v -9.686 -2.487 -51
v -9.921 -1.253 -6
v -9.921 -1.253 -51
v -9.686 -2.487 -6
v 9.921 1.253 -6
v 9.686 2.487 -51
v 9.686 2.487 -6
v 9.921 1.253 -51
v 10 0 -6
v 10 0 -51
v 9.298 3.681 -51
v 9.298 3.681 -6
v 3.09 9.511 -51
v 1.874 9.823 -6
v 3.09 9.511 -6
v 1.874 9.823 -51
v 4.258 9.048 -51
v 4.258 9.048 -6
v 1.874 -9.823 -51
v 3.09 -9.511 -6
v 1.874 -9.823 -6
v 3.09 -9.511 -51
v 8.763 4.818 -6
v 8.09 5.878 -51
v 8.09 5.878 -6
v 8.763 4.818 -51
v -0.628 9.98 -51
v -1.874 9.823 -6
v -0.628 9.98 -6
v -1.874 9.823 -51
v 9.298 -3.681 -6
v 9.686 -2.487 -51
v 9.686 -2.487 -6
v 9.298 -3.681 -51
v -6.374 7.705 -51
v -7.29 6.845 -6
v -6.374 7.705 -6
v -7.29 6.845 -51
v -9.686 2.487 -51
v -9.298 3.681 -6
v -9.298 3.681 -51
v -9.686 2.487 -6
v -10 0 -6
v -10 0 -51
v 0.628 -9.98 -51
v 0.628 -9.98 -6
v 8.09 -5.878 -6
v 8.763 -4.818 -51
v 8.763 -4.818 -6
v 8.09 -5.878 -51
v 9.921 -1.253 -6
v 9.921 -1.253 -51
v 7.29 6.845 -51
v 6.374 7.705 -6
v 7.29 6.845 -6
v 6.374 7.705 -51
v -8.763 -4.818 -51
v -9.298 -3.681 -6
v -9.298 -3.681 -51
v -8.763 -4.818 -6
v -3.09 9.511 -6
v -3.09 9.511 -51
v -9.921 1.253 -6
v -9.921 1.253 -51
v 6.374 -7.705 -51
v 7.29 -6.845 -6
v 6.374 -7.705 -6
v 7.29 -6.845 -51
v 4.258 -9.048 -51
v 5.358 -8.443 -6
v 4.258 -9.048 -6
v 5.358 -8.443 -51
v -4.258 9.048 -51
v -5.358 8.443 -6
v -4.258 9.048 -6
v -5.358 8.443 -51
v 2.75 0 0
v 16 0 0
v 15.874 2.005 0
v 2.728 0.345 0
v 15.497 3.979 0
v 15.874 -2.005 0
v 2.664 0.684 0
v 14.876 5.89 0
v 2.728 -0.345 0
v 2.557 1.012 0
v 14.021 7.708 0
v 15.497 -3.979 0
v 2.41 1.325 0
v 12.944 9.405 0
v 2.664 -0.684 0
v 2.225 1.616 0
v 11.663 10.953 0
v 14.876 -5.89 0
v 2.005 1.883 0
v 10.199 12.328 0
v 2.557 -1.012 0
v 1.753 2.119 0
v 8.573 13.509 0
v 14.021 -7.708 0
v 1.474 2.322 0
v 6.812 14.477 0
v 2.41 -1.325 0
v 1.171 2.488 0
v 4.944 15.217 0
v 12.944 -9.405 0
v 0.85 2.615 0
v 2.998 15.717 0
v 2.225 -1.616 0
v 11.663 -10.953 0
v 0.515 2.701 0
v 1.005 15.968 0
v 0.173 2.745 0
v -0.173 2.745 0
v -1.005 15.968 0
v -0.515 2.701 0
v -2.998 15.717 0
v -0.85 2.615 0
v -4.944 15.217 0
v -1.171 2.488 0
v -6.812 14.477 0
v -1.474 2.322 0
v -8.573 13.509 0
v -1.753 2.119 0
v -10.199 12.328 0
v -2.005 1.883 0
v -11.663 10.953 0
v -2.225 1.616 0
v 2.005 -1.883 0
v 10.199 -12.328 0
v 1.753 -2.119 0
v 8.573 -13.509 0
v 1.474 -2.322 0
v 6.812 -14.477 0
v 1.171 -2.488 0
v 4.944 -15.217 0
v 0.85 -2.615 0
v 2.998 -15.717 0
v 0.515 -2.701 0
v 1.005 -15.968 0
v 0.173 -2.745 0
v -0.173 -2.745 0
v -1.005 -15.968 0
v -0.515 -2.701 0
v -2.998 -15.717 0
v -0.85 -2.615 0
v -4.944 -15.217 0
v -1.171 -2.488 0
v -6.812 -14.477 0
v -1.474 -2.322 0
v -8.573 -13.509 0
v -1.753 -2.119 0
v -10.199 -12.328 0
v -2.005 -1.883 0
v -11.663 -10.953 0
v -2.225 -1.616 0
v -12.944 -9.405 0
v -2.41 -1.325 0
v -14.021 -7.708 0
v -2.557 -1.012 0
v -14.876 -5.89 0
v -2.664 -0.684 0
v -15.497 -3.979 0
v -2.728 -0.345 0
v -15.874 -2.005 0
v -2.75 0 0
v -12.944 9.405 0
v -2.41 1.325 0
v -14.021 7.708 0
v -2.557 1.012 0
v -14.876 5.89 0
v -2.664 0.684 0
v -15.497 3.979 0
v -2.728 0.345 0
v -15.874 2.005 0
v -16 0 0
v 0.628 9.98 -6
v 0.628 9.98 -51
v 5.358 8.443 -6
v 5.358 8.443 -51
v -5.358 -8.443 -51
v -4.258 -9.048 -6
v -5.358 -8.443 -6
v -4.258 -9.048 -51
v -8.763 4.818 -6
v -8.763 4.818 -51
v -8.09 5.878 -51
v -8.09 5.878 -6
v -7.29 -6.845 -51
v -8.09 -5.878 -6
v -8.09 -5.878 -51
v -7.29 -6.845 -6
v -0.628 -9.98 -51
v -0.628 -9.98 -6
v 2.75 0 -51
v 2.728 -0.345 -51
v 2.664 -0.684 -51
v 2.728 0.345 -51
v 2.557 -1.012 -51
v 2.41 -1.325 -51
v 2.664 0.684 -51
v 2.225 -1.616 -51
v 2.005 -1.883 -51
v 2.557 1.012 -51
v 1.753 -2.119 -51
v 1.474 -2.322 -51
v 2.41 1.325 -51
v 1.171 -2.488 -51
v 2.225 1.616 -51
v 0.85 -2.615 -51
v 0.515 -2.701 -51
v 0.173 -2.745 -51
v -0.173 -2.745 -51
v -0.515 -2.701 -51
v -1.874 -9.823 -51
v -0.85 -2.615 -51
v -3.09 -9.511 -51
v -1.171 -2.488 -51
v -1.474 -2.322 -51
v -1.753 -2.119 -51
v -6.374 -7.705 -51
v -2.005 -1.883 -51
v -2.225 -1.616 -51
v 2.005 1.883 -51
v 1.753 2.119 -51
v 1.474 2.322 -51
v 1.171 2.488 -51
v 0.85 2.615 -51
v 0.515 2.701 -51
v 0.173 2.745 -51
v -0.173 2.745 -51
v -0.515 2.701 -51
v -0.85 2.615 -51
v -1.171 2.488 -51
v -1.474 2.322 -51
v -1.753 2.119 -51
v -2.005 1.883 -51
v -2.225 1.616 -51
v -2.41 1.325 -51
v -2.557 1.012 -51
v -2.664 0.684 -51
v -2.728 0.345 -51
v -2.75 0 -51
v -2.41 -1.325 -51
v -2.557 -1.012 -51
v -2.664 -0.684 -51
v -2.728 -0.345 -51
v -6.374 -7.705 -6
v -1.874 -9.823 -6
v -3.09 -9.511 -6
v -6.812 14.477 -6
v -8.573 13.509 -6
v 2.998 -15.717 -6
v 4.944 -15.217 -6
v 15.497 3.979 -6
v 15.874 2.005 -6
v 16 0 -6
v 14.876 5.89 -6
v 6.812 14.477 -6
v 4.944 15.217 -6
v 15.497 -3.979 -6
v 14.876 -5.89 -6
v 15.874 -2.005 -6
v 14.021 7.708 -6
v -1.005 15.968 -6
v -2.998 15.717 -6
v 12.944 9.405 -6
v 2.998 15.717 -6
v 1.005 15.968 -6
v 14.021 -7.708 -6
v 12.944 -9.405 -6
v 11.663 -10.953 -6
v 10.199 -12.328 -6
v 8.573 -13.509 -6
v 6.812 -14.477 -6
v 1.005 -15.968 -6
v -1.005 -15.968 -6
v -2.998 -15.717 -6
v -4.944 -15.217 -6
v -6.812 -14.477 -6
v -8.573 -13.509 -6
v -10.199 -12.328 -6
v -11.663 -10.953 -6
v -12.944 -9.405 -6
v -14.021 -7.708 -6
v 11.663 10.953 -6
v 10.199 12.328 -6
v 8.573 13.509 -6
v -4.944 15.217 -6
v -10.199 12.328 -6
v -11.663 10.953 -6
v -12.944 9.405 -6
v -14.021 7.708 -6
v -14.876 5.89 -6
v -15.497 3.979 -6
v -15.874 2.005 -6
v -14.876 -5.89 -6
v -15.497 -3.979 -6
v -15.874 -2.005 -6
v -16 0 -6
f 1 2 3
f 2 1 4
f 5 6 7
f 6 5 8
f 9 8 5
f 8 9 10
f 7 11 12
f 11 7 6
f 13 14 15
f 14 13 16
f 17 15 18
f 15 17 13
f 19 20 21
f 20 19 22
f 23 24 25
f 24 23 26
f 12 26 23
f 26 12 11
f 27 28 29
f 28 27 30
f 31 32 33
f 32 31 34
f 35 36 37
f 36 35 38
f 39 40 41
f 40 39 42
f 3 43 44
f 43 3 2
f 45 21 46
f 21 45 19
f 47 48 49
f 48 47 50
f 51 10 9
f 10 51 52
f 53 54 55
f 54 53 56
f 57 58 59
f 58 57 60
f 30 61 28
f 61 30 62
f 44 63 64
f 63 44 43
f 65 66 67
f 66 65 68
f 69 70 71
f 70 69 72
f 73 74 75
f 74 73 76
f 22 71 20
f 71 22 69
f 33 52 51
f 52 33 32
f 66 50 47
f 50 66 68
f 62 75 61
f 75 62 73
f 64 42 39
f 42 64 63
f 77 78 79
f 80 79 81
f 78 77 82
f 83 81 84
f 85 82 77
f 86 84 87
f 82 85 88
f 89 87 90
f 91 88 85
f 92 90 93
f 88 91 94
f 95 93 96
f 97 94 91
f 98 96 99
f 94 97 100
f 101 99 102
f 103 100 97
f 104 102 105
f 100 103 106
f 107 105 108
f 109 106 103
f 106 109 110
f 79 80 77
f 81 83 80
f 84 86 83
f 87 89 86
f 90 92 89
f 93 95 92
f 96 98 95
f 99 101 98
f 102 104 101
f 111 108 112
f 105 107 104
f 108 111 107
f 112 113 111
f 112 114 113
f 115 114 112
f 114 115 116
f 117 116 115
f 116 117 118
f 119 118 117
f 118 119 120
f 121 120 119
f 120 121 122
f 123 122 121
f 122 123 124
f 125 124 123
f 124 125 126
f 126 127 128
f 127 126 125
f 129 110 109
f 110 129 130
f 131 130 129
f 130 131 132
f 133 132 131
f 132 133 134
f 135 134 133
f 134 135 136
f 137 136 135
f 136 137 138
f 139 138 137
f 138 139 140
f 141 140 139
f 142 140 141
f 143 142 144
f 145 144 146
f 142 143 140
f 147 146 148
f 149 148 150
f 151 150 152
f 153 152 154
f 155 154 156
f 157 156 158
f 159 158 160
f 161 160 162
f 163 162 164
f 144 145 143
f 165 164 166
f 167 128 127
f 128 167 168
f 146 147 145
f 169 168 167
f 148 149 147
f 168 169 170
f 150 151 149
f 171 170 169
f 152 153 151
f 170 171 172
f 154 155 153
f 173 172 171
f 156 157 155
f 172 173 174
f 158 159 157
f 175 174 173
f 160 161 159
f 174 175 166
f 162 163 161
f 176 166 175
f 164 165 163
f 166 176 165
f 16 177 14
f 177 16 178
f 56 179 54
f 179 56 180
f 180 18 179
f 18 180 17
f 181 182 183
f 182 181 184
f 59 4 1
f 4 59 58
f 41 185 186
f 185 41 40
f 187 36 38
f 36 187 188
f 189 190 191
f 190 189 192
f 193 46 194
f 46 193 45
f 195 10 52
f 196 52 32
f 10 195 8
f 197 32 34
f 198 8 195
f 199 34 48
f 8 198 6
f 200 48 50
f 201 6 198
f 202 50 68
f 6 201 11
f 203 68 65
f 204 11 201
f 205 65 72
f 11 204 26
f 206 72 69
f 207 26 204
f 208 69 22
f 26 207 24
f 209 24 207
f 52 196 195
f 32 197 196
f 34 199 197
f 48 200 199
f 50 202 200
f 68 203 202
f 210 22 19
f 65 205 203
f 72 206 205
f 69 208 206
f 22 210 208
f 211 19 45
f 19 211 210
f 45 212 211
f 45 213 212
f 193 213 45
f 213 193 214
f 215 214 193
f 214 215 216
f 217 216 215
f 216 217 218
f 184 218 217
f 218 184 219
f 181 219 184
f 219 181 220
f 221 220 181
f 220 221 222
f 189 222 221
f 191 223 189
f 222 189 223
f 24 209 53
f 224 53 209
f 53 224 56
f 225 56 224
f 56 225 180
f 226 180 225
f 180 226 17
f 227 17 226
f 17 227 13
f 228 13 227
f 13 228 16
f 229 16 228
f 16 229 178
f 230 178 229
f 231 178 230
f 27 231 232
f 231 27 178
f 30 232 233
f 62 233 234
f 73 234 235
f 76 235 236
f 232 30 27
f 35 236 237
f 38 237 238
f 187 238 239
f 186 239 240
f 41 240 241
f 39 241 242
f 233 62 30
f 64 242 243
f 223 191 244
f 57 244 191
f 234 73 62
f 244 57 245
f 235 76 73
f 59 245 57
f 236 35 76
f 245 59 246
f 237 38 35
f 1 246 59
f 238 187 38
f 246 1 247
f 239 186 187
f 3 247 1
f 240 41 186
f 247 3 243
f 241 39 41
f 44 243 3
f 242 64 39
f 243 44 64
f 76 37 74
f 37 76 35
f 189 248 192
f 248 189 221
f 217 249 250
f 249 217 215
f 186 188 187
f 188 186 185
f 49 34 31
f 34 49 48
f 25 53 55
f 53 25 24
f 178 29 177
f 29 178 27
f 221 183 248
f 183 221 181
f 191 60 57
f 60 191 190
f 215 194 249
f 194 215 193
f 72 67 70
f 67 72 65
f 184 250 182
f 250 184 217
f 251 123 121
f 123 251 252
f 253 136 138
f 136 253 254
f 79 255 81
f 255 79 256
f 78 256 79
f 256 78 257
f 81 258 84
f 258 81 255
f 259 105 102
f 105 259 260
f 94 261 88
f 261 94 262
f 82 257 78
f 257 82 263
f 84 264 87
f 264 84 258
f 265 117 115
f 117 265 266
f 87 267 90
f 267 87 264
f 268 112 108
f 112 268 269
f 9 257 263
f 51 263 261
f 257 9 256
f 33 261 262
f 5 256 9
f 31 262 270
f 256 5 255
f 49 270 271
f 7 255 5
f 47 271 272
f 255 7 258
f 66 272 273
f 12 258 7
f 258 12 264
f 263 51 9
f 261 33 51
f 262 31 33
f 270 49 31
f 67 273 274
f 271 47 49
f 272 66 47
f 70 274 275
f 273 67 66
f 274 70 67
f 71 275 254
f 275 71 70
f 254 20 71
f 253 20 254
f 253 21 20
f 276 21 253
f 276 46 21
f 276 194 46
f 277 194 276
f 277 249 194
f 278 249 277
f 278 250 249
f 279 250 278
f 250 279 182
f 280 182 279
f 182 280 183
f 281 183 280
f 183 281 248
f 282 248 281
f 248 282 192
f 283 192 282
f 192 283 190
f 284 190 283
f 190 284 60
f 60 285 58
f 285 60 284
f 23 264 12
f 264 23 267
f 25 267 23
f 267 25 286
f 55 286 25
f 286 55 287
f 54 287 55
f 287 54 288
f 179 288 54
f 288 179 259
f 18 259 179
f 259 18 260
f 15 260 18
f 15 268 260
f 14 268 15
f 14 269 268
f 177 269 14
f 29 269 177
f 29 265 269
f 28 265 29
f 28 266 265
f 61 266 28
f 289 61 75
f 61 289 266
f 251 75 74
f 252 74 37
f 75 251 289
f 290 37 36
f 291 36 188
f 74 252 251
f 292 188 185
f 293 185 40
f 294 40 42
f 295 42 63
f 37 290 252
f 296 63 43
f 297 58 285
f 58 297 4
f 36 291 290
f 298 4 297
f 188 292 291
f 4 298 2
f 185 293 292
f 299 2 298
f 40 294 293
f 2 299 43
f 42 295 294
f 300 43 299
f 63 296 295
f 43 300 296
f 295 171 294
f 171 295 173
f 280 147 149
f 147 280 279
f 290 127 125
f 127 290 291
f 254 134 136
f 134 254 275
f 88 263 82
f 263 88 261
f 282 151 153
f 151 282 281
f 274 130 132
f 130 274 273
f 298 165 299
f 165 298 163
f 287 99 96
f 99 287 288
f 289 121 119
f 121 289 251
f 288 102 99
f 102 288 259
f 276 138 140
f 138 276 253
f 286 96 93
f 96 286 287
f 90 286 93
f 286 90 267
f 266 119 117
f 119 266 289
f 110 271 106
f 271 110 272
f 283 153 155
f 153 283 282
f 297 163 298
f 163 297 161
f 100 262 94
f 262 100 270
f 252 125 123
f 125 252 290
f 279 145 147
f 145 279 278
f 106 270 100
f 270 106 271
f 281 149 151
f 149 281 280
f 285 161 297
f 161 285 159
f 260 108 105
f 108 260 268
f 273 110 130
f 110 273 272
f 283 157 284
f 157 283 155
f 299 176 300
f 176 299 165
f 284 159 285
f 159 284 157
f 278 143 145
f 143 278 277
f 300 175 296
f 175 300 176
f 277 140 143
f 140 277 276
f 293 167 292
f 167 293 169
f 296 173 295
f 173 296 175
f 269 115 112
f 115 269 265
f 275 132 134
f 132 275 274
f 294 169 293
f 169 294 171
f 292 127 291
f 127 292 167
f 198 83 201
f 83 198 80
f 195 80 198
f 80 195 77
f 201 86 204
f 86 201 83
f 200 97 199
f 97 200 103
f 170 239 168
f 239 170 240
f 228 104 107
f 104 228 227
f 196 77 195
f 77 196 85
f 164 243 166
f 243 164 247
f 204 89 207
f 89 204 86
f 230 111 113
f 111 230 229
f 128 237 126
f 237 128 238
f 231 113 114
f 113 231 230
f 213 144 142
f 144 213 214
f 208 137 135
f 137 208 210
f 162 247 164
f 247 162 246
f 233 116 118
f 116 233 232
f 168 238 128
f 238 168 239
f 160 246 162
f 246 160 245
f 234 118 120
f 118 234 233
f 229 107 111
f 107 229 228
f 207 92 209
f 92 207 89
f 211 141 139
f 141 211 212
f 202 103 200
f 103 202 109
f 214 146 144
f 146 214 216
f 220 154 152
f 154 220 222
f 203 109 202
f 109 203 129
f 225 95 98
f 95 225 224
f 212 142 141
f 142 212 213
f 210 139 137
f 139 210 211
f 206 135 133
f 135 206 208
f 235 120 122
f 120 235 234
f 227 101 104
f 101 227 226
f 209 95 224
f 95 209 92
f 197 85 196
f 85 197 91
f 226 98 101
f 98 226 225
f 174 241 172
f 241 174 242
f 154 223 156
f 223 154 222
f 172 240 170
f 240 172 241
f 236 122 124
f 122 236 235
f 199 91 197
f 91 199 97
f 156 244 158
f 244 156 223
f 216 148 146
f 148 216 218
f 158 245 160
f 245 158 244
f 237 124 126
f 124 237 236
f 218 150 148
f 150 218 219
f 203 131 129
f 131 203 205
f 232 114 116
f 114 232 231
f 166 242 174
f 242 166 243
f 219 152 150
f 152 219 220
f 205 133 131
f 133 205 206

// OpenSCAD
$fn = 50;


difference() {
	union() {
		translate(v = [0, 0, -51.0000000000]) {
			cylinder(h = 51, r = 10.0000000000);
		}
		translate(v = [0, 0, -6.0000000000]) {
			cylinder(h = 6, r = 16.0000000000);
		}
	}
	union() {
		#translate(v = [0, 0, -51]) {
			cylinder(h = 51, r = 2.7500000000);
		}
	}
}
